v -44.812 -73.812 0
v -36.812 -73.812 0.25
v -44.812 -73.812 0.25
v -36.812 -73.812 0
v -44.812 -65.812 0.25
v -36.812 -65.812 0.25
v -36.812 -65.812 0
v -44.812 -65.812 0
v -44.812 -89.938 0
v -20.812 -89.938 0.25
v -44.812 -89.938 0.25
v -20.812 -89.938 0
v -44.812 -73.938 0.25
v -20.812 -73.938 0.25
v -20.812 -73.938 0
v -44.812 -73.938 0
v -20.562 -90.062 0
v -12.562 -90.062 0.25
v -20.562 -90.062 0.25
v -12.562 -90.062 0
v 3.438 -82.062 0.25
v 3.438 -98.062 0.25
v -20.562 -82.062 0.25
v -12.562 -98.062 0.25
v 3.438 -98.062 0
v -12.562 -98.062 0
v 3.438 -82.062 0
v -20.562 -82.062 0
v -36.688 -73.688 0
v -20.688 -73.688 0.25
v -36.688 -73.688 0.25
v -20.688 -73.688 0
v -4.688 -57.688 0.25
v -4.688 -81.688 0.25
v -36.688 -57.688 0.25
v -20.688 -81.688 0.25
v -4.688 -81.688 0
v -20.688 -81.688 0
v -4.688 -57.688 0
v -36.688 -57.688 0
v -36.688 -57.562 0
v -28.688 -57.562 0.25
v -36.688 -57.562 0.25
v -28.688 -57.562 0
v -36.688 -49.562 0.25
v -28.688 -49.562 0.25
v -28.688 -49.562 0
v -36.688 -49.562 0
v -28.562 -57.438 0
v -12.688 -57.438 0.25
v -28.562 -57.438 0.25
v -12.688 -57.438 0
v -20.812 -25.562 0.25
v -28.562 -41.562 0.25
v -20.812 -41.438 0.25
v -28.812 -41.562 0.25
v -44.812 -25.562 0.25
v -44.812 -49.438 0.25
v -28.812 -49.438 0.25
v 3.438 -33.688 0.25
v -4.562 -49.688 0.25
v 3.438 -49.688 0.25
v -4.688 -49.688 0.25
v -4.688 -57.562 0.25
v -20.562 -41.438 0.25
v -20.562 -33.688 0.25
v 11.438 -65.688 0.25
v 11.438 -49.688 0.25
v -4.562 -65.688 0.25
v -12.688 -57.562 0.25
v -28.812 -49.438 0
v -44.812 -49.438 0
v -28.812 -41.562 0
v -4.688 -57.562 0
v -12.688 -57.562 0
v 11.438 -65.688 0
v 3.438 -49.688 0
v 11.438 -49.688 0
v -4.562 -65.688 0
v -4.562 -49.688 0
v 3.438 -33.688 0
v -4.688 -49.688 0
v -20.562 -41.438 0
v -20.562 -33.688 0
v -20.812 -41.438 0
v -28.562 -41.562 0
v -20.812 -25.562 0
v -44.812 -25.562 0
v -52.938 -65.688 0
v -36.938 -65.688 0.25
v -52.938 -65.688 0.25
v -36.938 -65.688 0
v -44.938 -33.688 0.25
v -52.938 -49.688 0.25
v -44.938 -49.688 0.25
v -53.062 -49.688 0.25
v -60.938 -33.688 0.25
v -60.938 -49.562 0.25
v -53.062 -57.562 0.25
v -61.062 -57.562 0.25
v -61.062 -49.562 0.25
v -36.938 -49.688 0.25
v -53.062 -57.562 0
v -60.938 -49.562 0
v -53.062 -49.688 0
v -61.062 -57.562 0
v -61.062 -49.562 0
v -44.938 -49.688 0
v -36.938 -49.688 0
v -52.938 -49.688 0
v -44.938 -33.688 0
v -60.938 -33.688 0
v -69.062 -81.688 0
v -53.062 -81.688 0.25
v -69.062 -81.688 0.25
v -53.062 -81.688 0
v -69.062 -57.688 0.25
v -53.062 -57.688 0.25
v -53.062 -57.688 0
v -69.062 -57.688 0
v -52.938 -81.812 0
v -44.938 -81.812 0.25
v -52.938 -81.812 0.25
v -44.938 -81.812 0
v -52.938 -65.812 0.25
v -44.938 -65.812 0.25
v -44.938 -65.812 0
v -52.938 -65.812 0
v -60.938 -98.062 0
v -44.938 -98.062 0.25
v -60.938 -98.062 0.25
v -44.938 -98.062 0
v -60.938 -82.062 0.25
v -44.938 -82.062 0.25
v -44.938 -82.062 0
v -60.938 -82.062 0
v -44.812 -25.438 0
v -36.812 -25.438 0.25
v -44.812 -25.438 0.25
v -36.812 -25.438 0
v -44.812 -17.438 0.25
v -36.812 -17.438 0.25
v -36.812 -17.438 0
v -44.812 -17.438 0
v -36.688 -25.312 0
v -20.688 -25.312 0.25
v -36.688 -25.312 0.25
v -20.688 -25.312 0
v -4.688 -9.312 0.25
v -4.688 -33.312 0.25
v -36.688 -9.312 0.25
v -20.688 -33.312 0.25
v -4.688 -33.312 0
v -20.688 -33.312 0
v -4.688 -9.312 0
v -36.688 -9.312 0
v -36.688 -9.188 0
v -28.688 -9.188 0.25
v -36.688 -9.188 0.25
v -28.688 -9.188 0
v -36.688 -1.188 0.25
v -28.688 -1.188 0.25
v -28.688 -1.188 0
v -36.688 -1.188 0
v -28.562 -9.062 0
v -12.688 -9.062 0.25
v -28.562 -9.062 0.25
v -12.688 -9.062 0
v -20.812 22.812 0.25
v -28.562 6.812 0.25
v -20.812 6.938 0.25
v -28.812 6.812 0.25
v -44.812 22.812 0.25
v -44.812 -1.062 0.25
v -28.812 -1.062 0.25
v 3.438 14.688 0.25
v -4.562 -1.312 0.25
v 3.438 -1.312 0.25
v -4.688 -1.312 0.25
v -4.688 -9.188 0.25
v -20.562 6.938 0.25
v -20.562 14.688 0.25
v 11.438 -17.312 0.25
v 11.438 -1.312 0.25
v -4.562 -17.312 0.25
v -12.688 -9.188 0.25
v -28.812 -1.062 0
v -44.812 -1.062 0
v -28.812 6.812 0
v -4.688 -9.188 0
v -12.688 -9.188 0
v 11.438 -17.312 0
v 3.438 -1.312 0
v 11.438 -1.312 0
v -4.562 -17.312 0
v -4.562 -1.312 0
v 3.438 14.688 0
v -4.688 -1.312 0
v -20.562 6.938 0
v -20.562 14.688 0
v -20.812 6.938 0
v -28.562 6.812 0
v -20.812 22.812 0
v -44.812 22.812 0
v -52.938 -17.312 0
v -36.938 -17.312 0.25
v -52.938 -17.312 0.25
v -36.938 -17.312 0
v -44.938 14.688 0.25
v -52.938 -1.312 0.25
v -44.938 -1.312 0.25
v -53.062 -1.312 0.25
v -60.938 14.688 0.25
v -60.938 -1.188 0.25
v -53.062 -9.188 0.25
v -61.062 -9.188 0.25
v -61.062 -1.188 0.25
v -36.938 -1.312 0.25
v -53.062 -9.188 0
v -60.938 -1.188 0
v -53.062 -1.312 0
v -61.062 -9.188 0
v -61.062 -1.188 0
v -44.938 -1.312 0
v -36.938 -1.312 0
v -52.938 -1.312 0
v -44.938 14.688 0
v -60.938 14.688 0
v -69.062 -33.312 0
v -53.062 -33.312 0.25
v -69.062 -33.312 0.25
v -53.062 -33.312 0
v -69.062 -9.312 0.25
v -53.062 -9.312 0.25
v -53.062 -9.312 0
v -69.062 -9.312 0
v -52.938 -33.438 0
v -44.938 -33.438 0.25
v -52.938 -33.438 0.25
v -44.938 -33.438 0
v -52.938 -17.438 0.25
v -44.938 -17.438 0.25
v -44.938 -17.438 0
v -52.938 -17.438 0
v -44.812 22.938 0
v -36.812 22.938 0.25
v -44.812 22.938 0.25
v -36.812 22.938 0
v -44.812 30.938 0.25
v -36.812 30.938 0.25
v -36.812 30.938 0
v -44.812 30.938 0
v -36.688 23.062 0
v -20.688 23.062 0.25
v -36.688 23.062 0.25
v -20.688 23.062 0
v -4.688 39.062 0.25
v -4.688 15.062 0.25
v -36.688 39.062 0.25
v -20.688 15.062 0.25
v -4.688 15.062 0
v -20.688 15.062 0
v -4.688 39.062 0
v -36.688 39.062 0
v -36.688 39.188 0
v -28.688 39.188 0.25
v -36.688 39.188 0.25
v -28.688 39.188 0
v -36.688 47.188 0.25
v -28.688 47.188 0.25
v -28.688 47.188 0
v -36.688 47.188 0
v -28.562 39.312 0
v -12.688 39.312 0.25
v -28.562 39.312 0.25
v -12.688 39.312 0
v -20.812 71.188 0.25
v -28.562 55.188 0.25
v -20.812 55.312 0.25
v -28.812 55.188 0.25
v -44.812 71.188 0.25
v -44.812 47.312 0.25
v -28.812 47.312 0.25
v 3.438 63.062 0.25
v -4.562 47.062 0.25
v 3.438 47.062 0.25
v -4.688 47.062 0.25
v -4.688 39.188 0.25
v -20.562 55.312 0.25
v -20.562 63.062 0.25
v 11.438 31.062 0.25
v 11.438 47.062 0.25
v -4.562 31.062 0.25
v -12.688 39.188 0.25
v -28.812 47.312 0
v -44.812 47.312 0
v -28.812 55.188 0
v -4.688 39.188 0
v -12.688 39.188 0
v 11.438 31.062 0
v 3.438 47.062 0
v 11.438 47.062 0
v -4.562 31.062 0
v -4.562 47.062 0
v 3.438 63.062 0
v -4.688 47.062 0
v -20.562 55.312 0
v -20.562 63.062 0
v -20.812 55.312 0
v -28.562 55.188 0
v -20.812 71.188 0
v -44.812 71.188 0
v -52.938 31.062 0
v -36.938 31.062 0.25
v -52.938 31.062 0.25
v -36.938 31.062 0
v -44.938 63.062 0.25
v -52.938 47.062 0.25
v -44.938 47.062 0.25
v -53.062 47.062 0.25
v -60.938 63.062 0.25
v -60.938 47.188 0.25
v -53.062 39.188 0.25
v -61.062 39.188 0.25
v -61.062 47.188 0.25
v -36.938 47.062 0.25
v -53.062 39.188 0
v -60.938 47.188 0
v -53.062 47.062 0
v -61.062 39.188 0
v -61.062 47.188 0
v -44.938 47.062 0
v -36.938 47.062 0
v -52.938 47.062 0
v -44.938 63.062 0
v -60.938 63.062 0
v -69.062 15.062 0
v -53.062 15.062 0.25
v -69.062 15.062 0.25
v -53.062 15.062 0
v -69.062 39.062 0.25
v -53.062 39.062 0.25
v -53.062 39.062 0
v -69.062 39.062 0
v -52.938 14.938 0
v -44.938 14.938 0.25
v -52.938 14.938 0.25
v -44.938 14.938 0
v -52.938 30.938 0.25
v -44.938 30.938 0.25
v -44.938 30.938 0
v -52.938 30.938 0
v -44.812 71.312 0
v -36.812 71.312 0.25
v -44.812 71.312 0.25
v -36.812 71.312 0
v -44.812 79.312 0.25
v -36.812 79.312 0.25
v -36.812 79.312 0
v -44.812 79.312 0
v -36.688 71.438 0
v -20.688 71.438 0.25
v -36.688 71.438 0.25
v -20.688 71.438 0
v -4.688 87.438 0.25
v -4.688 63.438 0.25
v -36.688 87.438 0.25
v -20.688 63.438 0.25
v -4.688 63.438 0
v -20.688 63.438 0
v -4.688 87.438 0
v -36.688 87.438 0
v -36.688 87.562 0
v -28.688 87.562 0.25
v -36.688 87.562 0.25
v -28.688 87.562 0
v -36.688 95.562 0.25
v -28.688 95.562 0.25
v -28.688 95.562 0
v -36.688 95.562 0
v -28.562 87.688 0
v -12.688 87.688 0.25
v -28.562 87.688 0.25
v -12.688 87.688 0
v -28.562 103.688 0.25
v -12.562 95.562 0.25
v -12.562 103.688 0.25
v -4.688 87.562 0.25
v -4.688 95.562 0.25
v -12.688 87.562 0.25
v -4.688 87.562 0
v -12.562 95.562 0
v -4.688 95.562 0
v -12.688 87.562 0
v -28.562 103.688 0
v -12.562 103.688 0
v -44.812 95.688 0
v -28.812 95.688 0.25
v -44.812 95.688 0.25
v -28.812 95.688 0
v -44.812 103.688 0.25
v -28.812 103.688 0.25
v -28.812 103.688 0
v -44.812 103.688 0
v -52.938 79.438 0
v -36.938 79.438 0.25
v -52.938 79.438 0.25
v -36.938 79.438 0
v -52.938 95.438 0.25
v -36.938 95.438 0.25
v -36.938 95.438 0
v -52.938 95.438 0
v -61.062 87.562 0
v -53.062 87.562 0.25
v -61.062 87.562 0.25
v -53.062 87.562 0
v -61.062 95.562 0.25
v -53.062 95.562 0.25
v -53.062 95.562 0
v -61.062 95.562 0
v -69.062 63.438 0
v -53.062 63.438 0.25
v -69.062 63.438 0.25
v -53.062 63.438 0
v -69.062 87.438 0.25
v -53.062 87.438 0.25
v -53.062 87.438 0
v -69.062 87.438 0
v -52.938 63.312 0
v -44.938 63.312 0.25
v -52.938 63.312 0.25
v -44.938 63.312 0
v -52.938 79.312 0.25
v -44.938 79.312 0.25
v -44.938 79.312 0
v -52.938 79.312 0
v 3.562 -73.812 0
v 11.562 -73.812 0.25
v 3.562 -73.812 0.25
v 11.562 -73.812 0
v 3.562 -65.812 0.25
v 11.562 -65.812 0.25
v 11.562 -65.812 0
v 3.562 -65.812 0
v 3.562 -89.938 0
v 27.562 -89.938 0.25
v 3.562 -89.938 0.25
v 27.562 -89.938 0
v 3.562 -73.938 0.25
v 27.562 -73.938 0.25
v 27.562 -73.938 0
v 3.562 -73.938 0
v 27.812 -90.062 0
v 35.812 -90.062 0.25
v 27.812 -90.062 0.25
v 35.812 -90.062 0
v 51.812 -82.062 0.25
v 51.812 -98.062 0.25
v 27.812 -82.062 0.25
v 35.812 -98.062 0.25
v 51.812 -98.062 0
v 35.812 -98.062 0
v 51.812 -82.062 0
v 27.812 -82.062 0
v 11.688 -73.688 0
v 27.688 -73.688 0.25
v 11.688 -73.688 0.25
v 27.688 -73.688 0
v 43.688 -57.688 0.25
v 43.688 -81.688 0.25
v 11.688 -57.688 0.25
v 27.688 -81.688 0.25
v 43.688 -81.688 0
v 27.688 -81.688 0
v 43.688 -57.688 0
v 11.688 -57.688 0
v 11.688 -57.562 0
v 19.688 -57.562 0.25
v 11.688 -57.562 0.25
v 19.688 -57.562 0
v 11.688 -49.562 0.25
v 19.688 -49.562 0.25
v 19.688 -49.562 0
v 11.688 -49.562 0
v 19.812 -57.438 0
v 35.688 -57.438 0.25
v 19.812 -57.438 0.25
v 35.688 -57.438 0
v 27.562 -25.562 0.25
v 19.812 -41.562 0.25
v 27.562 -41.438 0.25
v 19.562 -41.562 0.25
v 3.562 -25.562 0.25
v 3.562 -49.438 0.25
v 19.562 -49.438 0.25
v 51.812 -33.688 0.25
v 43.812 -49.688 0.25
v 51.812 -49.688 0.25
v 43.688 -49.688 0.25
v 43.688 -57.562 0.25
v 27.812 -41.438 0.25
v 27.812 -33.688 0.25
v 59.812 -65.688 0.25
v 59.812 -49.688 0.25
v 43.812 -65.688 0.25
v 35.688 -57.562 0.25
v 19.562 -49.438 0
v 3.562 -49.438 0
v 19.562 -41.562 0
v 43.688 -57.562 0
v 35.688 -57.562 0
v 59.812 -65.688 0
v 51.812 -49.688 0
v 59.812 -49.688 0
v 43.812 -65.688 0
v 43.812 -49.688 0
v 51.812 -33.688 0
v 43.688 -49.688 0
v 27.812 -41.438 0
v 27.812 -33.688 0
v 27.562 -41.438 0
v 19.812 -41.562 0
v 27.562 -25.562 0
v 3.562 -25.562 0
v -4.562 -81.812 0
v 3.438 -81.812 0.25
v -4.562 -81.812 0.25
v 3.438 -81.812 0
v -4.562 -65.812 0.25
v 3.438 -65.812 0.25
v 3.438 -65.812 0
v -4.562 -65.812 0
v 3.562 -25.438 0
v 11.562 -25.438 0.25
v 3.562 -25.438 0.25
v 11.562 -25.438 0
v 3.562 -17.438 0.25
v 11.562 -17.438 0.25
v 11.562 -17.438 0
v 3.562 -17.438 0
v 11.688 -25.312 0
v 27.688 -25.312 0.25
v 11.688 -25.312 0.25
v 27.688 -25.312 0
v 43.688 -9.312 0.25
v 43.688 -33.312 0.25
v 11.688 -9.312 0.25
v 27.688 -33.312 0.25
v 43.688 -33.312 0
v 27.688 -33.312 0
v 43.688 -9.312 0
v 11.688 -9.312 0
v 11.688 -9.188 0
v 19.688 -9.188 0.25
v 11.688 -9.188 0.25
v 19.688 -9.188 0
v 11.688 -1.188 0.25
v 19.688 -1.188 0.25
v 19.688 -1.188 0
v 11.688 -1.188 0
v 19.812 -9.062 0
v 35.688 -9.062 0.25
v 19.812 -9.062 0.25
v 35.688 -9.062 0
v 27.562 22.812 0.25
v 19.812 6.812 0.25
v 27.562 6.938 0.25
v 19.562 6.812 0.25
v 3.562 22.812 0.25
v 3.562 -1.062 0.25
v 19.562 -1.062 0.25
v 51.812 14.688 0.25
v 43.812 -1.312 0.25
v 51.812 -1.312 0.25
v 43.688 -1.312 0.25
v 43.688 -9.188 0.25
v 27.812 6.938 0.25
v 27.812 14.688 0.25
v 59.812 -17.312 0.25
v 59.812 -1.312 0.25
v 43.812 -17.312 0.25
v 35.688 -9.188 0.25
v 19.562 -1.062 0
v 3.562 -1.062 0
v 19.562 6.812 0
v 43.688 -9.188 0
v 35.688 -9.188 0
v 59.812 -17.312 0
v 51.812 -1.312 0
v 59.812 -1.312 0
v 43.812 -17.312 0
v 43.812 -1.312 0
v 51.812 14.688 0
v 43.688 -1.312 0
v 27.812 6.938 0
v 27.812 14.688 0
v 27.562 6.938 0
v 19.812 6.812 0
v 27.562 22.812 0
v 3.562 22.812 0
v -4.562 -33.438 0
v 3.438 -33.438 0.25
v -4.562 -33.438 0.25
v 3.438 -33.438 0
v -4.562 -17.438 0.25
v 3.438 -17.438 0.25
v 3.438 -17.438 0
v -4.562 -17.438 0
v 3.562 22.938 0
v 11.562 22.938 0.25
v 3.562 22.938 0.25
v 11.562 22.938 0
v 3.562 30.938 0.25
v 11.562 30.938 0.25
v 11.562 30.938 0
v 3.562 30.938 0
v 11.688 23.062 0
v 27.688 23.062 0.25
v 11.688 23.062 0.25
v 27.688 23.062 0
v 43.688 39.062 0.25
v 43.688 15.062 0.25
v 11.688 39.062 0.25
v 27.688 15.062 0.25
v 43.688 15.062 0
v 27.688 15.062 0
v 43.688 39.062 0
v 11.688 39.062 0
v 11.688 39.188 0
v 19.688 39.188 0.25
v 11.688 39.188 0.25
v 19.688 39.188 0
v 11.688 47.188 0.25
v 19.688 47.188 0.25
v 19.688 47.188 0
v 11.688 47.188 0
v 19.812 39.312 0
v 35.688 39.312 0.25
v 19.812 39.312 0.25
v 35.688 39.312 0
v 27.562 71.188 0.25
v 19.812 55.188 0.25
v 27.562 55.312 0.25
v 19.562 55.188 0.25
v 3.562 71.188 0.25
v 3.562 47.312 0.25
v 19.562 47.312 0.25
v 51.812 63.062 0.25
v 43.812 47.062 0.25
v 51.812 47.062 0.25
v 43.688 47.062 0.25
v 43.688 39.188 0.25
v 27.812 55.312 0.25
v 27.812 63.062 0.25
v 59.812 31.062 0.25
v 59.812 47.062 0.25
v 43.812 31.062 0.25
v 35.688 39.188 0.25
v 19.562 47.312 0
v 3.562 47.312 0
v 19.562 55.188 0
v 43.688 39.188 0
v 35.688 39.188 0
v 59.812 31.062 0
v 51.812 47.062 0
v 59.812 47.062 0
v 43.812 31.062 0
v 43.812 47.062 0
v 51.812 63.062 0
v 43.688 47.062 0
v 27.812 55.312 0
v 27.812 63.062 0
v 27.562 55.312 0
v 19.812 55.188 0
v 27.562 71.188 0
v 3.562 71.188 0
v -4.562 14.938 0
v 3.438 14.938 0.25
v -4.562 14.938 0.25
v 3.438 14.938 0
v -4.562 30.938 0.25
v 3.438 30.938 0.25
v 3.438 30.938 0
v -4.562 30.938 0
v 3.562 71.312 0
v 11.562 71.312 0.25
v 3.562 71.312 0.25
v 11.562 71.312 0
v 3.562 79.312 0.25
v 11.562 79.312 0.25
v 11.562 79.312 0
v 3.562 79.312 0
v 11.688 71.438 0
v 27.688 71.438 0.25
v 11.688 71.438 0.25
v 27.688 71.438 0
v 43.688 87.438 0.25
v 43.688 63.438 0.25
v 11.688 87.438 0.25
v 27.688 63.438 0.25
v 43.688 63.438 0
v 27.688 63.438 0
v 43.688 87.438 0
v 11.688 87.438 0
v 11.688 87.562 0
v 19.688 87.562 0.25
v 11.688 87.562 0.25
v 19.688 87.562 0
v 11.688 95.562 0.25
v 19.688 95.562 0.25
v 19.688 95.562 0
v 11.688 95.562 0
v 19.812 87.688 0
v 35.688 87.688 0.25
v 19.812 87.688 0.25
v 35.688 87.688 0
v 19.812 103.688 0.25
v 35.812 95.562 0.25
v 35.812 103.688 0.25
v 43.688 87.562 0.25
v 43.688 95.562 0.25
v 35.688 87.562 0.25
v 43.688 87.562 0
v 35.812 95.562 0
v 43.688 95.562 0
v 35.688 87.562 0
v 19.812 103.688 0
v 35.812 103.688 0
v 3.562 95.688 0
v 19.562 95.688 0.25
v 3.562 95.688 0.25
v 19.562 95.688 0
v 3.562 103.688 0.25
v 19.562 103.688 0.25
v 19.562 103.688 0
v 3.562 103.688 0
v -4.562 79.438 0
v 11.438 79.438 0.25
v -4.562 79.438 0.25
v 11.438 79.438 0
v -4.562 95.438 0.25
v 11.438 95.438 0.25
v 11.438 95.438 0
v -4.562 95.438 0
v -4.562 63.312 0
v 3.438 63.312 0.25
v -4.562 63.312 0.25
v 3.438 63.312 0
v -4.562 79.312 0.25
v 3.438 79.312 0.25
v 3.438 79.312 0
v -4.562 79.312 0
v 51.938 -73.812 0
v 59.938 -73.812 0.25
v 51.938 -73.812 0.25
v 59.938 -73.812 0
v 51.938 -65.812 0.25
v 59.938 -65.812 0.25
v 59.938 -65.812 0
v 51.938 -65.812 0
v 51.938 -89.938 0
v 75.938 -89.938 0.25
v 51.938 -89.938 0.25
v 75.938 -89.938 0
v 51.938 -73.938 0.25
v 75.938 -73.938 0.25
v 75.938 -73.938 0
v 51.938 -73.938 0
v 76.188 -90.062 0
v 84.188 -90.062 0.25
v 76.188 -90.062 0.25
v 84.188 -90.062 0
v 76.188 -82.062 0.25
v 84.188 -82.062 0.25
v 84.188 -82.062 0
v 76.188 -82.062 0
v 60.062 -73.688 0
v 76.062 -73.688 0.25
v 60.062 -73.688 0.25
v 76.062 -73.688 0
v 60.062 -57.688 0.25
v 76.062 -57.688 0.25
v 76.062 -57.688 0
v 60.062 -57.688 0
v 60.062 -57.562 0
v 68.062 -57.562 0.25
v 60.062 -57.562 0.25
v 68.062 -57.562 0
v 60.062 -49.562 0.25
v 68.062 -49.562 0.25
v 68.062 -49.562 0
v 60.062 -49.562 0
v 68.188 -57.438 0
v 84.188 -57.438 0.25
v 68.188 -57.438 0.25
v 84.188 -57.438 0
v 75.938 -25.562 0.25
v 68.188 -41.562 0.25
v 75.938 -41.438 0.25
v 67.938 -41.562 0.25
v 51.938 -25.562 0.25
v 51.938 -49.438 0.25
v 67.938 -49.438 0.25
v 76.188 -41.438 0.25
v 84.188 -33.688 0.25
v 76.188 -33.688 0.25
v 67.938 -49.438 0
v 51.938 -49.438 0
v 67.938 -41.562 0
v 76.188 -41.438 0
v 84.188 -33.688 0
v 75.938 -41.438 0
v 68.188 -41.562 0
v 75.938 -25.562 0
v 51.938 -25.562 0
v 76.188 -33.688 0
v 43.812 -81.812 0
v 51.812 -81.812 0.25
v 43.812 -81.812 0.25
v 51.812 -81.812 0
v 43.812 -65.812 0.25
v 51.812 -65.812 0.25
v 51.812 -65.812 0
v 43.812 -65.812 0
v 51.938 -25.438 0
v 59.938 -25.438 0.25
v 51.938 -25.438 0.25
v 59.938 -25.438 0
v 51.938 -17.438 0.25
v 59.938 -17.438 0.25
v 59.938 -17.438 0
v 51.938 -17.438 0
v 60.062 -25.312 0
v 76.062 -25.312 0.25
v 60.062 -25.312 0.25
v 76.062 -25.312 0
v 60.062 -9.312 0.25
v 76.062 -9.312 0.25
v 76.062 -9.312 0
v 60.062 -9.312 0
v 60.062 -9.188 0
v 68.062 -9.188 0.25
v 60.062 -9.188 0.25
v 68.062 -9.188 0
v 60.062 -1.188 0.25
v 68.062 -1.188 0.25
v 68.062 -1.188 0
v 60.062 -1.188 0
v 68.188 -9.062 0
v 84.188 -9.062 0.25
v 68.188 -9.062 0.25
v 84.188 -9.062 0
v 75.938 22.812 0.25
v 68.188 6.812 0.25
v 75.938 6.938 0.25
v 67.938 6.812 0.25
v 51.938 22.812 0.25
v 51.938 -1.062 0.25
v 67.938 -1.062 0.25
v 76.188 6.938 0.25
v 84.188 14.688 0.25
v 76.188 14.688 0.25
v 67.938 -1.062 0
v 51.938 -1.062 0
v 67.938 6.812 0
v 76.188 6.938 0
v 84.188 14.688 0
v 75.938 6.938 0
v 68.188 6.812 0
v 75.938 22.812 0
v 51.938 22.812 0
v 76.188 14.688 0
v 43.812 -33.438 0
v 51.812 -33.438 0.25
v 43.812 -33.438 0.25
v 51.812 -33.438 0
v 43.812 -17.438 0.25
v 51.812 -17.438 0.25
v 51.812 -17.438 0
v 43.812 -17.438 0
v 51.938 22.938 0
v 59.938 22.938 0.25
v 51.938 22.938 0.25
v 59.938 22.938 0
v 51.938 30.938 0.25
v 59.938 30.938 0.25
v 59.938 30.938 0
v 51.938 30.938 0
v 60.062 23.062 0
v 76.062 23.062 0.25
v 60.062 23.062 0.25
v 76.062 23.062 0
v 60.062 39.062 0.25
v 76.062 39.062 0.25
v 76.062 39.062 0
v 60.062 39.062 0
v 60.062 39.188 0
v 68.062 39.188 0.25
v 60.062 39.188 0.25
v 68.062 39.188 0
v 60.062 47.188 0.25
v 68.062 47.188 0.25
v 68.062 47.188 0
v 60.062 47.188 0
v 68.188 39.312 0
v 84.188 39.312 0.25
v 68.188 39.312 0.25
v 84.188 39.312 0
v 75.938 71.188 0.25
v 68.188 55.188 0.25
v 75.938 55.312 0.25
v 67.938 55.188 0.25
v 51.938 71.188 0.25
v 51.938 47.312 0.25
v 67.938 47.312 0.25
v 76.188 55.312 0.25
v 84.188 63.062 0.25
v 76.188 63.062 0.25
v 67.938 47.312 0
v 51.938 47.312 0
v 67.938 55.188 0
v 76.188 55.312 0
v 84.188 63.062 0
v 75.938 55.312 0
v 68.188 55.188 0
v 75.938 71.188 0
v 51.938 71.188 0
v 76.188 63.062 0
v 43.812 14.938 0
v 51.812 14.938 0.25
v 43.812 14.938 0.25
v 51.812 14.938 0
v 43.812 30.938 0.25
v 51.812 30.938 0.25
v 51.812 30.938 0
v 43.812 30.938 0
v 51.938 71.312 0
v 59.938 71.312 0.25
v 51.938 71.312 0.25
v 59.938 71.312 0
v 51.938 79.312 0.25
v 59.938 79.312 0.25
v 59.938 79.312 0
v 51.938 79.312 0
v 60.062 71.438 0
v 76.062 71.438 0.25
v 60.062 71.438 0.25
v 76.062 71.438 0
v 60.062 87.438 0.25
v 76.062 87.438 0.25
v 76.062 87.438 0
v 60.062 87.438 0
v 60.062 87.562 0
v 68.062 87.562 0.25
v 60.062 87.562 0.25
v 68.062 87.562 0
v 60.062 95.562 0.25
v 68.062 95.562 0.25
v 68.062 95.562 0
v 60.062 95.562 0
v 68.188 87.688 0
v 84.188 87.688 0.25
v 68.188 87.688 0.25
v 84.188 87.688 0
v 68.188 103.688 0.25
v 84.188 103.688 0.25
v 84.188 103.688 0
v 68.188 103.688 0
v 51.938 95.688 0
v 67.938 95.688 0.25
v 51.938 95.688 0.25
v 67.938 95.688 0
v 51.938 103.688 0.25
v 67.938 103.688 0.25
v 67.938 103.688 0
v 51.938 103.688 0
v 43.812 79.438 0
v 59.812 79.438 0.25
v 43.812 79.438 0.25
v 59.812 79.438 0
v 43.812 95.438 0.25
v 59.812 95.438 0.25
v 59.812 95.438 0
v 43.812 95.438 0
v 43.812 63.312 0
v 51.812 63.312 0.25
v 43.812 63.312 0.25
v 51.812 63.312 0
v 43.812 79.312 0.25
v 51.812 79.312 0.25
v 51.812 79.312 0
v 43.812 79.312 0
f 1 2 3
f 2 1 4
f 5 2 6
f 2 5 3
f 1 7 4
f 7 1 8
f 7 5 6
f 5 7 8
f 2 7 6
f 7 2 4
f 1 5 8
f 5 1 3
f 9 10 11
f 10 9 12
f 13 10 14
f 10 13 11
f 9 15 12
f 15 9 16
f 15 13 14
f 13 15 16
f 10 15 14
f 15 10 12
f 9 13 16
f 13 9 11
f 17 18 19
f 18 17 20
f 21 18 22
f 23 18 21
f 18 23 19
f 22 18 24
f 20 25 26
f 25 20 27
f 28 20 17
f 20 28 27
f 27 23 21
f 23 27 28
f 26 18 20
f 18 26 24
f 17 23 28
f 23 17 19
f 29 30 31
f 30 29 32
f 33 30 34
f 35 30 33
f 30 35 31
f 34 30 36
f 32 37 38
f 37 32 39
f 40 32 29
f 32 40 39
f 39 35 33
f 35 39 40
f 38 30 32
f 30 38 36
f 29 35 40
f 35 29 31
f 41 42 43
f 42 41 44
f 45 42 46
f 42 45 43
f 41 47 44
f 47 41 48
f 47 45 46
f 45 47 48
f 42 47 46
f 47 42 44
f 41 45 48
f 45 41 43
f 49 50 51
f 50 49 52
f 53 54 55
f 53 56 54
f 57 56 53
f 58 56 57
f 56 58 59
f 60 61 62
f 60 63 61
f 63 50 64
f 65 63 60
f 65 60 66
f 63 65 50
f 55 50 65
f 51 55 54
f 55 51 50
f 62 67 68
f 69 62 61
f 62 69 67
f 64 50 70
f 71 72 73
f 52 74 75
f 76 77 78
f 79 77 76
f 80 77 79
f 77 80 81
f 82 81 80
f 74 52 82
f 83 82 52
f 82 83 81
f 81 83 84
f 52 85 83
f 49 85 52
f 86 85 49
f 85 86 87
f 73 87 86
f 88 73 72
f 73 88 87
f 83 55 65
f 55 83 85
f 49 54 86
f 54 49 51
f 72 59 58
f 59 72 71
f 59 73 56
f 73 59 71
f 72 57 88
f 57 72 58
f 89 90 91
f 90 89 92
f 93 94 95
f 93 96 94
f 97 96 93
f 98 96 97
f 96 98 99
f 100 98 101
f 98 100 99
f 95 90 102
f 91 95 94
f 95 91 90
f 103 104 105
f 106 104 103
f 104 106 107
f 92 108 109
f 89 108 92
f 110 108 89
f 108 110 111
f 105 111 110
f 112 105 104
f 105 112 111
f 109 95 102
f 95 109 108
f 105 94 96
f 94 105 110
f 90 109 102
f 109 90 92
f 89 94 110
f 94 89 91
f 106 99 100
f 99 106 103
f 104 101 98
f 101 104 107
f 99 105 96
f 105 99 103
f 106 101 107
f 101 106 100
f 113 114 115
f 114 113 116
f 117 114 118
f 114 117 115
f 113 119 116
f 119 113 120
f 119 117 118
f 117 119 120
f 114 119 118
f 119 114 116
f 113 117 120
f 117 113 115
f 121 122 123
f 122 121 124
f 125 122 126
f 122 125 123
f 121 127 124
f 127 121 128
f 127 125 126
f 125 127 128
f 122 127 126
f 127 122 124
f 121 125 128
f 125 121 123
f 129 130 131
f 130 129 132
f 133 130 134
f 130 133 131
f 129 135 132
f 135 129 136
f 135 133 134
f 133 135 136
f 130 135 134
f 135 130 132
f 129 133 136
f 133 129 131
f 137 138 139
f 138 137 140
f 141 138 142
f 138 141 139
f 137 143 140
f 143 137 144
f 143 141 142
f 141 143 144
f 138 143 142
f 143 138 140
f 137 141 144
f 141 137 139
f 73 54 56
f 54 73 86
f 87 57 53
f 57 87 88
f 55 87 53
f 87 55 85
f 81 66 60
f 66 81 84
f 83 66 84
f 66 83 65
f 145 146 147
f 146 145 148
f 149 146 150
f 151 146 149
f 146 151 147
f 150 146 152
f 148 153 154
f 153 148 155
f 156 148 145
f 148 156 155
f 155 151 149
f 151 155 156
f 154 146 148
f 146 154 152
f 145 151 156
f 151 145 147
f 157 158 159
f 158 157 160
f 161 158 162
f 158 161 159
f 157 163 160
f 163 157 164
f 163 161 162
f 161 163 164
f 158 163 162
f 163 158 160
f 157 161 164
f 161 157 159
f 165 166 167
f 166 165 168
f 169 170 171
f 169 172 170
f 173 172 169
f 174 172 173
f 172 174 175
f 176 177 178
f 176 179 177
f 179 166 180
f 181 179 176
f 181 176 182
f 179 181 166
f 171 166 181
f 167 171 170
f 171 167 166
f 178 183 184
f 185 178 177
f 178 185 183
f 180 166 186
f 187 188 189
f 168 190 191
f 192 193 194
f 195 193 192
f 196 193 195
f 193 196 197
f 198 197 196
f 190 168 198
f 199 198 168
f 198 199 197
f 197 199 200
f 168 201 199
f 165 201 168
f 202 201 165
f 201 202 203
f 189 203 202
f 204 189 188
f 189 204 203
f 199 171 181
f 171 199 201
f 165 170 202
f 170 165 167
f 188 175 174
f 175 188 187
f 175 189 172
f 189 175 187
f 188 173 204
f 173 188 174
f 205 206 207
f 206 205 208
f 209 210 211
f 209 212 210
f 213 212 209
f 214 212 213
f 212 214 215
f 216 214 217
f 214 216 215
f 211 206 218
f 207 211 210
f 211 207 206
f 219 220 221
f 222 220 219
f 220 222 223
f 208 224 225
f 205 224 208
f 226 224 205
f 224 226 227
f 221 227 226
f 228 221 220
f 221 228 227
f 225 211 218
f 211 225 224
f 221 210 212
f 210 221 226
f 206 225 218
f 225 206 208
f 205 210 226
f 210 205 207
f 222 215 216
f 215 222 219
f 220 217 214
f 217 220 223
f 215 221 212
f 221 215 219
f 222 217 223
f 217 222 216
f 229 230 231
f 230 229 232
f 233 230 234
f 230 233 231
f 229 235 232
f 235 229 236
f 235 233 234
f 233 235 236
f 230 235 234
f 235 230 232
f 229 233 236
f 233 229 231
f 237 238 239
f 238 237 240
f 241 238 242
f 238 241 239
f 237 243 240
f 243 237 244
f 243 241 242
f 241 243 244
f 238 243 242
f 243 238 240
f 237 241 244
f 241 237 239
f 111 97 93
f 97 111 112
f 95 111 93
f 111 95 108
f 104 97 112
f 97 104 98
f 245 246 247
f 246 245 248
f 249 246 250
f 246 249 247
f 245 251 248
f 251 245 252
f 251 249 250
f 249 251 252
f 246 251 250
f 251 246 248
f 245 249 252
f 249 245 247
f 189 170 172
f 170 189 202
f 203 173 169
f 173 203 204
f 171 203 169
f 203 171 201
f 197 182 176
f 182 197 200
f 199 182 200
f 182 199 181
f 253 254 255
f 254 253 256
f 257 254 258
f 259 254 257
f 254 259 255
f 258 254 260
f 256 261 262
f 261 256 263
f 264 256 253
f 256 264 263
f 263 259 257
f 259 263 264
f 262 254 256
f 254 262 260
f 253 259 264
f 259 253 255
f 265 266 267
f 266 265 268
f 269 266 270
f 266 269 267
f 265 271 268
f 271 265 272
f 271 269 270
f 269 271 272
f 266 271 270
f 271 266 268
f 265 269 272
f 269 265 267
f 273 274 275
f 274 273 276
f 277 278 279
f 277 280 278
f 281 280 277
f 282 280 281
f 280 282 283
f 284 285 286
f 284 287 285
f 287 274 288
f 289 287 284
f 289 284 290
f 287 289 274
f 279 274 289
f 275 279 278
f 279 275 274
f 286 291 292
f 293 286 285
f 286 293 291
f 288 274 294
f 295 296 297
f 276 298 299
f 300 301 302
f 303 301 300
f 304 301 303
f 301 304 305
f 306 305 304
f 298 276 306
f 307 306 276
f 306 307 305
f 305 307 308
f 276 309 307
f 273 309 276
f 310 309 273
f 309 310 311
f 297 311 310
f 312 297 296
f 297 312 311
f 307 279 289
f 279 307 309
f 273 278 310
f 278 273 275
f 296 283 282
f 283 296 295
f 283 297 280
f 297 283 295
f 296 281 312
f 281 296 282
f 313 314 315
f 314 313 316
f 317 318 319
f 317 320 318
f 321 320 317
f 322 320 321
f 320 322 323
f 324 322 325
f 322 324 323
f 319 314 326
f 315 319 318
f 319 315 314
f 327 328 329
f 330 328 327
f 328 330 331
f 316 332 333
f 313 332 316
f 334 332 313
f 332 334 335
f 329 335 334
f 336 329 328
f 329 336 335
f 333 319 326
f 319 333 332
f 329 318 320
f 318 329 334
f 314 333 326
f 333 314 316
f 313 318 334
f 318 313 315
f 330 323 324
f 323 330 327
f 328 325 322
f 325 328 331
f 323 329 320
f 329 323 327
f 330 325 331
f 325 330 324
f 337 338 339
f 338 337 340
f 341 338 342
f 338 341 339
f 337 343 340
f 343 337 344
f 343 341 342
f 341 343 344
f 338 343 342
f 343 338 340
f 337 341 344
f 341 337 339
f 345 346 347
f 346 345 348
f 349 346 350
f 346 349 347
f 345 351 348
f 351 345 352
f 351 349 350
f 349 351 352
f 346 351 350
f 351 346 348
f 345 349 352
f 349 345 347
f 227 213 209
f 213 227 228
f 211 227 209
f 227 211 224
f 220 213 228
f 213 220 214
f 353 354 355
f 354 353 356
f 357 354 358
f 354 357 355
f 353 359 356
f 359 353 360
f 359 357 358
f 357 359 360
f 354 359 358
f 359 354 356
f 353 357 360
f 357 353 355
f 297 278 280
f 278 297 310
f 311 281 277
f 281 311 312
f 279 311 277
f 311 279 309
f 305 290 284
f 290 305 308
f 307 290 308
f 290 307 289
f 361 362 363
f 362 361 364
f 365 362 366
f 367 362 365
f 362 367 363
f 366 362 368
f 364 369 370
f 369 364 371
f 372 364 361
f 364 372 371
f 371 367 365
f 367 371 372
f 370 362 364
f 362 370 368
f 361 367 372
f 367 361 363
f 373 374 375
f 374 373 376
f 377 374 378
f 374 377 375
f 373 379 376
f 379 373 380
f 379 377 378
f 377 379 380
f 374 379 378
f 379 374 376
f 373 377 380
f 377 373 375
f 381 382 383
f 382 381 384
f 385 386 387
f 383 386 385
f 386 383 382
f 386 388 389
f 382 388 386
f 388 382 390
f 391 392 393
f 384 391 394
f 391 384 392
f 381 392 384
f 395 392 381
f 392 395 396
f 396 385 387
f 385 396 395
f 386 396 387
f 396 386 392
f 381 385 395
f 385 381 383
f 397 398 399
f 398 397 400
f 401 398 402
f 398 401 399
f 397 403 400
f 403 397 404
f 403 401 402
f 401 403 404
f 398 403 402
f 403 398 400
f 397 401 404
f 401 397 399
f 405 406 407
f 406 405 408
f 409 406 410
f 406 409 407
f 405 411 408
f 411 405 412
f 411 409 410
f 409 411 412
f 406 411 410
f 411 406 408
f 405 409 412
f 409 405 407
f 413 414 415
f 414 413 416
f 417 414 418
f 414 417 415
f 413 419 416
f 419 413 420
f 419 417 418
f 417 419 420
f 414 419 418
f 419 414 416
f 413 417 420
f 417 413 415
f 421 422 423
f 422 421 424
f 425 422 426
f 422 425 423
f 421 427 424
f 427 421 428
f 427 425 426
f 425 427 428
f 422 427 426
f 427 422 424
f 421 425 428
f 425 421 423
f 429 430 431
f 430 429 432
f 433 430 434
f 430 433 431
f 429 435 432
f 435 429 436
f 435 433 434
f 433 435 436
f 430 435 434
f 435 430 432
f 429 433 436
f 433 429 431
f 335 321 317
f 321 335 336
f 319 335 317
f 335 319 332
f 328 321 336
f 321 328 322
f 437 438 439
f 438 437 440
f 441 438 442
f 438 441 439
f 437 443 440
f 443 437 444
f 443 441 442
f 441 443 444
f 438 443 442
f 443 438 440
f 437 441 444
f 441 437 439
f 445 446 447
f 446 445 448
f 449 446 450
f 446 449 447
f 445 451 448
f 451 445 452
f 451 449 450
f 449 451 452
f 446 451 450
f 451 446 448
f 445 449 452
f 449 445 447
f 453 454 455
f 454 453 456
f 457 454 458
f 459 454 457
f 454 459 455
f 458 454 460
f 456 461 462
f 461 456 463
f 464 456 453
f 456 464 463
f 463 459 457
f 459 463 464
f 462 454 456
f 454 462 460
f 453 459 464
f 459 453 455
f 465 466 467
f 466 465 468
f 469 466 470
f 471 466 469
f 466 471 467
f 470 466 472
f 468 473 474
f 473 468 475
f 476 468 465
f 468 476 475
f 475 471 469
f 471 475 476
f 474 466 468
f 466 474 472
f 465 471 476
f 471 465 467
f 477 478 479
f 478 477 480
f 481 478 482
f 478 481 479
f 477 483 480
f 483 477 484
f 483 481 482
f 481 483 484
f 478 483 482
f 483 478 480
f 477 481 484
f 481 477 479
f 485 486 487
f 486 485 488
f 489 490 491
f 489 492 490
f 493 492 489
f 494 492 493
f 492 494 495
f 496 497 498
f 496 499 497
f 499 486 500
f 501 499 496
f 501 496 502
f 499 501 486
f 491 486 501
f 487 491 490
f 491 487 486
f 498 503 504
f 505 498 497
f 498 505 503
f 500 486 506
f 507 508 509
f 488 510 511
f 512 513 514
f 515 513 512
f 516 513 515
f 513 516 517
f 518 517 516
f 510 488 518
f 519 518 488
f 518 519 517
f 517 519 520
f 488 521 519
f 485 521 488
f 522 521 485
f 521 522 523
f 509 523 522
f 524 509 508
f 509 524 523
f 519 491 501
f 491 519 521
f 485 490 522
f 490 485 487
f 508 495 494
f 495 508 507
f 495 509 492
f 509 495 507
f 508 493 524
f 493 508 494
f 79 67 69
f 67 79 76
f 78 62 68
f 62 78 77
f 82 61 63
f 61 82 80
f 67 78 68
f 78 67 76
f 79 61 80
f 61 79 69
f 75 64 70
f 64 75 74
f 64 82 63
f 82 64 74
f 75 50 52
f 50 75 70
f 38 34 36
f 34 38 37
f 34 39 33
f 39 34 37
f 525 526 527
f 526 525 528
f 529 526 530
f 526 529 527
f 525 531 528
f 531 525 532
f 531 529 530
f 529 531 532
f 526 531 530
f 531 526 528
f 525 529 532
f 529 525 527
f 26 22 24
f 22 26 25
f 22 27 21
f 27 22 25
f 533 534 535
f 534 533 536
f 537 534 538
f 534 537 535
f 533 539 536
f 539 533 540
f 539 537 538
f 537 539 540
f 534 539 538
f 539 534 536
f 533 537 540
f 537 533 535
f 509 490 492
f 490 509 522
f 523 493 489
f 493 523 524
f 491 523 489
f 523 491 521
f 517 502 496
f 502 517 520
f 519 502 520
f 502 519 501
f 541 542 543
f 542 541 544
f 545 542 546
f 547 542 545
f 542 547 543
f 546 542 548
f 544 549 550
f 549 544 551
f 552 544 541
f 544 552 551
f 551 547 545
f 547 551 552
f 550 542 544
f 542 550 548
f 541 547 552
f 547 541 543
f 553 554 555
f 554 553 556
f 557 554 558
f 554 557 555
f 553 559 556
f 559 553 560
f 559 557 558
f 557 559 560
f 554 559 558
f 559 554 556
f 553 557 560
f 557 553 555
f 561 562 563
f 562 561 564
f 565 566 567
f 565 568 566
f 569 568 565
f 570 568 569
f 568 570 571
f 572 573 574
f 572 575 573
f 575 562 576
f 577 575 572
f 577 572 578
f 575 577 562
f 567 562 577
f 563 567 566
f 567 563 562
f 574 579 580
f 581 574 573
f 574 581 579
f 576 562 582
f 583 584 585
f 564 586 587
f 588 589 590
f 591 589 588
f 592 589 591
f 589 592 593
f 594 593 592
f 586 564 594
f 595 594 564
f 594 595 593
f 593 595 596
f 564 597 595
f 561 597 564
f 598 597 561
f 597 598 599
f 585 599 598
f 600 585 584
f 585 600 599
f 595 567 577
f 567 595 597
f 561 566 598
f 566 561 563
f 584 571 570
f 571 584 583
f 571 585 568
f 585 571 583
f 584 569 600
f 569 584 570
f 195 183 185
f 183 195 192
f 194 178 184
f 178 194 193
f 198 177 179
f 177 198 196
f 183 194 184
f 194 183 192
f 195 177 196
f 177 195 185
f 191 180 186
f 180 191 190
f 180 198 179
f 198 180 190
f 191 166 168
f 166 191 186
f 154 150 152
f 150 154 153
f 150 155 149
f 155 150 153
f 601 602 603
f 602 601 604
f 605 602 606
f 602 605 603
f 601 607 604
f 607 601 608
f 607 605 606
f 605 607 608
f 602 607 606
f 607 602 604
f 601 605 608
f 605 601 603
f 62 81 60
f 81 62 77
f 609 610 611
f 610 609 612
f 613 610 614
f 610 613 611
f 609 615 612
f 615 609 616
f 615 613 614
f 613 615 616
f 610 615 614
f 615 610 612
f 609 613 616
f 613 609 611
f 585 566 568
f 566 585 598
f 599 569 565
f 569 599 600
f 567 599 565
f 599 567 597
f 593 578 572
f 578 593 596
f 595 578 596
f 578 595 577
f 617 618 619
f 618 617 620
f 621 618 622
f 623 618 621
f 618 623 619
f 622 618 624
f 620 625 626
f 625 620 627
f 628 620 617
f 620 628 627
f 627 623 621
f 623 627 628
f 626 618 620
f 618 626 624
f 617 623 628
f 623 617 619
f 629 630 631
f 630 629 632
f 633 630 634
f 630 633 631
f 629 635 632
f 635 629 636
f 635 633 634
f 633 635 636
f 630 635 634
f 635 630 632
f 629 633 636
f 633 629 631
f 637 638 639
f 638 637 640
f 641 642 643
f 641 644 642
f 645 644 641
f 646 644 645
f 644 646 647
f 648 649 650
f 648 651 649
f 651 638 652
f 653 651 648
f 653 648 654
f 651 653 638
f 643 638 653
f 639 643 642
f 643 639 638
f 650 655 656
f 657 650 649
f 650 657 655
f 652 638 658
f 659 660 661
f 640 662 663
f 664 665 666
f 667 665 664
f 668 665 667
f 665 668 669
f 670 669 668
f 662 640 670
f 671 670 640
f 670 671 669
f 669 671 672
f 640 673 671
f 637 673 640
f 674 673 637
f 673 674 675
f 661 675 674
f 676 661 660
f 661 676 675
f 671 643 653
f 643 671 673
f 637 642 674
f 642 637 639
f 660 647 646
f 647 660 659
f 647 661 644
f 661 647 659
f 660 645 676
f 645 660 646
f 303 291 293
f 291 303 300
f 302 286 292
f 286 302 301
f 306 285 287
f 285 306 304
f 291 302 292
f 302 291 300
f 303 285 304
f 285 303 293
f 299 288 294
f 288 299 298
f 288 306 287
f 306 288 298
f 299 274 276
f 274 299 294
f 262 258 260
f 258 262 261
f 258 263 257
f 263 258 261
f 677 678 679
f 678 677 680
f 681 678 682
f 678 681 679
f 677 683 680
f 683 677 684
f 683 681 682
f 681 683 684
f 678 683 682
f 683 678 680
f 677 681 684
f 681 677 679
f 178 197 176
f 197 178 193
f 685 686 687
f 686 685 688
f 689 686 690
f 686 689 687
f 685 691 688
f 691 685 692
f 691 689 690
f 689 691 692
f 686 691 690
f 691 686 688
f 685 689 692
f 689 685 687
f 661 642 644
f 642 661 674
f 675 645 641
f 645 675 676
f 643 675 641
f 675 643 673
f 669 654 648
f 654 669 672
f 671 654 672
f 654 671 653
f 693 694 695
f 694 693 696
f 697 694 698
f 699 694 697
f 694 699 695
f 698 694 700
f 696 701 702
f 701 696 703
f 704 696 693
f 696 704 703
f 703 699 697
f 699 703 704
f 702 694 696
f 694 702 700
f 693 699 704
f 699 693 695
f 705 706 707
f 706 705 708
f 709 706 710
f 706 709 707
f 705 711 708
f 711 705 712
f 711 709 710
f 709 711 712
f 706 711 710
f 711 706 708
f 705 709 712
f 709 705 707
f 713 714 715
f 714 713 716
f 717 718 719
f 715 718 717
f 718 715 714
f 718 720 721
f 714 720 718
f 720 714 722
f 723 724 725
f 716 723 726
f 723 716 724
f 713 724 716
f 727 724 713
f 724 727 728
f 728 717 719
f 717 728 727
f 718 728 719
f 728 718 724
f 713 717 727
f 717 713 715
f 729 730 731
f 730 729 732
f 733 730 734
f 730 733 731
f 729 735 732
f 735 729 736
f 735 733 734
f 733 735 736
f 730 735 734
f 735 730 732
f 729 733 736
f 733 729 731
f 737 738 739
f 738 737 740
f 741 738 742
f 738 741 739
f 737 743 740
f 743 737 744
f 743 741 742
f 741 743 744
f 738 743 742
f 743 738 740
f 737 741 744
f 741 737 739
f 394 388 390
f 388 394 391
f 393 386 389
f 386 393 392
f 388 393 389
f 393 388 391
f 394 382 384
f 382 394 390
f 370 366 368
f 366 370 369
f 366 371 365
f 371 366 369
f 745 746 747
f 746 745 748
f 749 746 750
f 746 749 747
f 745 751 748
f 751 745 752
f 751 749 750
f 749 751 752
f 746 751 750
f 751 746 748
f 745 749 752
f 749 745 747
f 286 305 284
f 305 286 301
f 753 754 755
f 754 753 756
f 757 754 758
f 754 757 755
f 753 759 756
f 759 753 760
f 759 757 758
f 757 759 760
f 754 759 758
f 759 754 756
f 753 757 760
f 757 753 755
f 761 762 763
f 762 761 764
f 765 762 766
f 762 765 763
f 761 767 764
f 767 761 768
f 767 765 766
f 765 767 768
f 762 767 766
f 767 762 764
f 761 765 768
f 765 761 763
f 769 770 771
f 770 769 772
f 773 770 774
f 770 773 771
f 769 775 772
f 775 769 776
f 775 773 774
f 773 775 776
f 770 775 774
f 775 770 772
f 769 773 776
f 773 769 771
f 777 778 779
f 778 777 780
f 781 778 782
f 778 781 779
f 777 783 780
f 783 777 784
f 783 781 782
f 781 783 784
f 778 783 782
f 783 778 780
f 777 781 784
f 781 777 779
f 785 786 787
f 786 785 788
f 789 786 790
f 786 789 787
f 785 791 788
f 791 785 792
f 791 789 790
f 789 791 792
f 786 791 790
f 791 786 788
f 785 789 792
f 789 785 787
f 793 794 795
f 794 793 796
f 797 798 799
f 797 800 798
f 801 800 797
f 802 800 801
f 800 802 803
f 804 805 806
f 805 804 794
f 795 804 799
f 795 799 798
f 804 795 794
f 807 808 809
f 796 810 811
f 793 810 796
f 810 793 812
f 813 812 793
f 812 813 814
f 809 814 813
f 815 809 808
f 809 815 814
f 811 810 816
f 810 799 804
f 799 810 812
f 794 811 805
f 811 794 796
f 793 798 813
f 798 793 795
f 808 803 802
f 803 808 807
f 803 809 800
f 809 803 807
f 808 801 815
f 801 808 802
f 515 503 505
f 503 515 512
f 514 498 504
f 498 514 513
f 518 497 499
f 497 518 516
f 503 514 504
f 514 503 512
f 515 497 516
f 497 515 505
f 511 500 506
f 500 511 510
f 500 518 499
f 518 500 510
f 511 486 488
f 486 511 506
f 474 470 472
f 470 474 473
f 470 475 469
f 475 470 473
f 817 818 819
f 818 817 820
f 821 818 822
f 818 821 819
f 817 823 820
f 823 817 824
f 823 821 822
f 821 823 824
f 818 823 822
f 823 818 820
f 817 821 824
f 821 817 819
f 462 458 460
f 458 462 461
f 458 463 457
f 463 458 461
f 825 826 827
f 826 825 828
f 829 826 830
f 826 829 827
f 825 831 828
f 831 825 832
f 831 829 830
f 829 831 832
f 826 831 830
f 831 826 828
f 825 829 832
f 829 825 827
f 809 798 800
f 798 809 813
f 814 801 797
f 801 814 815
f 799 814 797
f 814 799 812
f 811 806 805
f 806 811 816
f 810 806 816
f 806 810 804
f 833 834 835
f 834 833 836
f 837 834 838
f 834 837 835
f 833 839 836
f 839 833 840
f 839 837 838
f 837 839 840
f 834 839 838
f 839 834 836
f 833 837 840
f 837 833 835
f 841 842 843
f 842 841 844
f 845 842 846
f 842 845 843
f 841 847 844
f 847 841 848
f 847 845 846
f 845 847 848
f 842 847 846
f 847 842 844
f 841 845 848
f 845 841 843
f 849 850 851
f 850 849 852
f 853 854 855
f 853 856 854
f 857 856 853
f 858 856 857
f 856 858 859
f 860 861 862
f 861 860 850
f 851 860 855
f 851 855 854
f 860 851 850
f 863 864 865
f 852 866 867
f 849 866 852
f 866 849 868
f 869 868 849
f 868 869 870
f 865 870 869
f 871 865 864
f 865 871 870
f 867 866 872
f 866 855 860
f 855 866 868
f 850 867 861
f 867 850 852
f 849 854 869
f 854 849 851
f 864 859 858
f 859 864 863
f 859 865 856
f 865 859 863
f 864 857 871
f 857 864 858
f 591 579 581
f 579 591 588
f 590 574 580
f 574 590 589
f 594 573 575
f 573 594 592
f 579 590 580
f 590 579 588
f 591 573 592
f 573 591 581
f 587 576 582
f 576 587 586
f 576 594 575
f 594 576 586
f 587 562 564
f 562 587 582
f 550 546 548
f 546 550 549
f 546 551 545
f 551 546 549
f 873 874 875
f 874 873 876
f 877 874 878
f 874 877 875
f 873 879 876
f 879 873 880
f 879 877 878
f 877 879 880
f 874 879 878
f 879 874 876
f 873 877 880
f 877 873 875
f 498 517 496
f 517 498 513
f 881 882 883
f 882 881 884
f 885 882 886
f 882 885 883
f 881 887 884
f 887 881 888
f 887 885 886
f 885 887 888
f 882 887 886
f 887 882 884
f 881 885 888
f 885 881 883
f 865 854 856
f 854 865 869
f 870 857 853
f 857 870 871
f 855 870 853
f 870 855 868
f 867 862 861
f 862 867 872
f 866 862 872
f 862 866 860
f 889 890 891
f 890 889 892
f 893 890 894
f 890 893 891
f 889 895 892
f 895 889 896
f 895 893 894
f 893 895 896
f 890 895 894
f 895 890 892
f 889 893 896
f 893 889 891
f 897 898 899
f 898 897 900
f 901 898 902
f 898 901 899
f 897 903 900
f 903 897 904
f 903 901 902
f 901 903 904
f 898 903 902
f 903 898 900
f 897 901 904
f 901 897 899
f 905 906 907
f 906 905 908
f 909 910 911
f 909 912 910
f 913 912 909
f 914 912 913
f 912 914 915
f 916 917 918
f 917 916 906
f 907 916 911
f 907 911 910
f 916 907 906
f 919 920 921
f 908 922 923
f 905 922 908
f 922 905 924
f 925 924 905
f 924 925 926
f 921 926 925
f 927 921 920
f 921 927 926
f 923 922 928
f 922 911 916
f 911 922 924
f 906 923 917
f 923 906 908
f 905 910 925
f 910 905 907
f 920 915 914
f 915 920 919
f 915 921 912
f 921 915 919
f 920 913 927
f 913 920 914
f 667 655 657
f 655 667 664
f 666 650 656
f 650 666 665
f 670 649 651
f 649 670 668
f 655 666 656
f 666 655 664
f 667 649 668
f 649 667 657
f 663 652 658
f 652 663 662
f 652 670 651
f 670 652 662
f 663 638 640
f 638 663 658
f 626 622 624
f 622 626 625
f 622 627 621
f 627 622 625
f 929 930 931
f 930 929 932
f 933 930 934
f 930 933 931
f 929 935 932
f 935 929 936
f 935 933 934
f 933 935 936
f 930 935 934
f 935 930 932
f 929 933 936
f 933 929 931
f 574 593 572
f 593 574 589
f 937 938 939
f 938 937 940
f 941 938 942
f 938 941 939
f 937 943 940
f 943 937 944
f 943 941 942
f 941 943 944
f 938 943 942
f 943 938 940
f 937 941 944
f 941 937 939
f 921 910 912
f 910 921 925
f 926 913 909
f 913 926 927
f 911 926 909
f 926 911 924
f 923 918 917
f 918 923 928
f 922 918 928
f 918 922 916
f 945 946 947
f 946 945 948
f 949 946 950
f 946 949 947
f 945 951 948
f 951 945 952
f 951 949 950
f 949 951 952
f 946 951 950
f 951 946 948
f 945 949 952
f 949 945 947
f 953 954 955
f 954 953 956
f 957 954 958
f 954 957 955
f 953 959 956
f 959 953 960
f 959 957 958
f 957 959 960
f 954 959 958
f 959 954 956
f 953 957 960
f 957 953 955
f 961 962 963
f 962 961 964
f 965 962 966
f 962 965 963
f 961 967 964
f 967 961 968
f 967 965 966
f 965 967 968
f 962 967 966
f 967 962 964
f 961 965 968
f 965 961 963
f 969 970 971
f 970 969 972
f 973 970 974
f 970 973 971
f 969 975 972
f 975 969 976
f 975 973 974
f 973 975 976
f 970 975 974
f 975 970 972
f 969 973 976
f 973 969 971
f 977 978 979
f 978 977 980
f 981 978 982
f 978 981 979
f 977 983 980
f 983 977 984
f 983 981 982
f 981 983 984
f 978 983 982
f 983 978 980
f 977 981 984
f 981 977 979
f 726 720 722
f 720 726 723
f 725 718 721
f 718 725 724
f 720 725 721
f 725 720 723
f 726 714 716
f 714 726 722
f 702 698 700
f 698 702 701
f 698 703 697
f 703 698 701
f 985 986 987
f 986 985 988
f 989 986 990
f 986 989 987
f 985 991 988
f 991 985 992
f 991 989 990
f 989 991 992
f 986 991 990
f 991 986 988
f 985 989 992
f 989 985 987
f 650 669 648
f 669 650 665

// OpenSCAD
GROUT_SIZE=.125;
PATTERN_WIDTH=48+GROUT_SIZE*3;
PATTERN_LENGTH=48+GROUT_SIZE*3;
COLORS=[ "red", "blue", "green" ];

ROOM_WIDTH=11.5*12;
ROOM_LENGTH=15*12;
ROOM_HEIGHT=8*12;

module drawTile(width,height)
{
	cube([width,height,.25]);
}

module drawVersaille()
{
	rotate([0,0,-90])
	{
	drawTile(8,8);
	
	translate([8+GROUT_SIZE,0,0])
	drawTile(16,24);

	translate([16+GROUT_SIZE*2,24+GROUT_SIZE*2,0])
	drawTile(8,8);

	translate([-8-GROUT_SIZE,8+GROUT_SIZE,0])
	drawTile(16,16);

	translate([-16-GROUT_SIZE*2,8+GROUT_SIZE,0])
	drawTile(8,8);

	translate([-24-GROUT_SIZE*3,16+GROUT_SIZE*2,0])
	drawTile(16,16);

	translate([-24-GROUT_SIZE*3,0,0])
	drawTile(8,16);

	translate([-16-GROUT_SIZE*1,-8-GROUT_SIZE,0])
	drawTile(16,16);

	translate([-16-GROUT_SIZE*2,-16-GROUT_SIZE*2,0])
	drawTile(8,8);

	translate([-8-GROUT_SIZE*1,-24-GROUT_SIZE*2,0])
	drawTile(24,16);

	translate([0,-8-GROUT_SIZE*1,0])
	drawTile(16,8);

	translate([16+GROUT_SIZE*2,-16-GROUT_SIZE*1,0])
	drawTile(16,16);
	}
}

translate([-1*ROOM_WIDTH/2,-1*ROOM_LENGTH/2,0])
%cube([ROOM_WIDTH,ROOM_LENGTH,ROOM_HEIGHT]);

xCount=3;
yCount=4;
xSpacing=PATTERN_WIDTH;
ySpacing=PATTERN_LENGTH;

translate([-1*ROOM_WIDTH/2+PATTERN_WIDTH/2,-1*ROOM_LENGTH/2+PATTERN_LENGTH/2,0])
for ( x = [ 0 : xCount-1 ] )
{
	for ( y= [ 0 : yCount-1 ] )
	{
		color(COLORS[(x+y)%3])
		translate([x*xSpacing, y*ySpacing, 0])
		drawVersaille();
	}
}
